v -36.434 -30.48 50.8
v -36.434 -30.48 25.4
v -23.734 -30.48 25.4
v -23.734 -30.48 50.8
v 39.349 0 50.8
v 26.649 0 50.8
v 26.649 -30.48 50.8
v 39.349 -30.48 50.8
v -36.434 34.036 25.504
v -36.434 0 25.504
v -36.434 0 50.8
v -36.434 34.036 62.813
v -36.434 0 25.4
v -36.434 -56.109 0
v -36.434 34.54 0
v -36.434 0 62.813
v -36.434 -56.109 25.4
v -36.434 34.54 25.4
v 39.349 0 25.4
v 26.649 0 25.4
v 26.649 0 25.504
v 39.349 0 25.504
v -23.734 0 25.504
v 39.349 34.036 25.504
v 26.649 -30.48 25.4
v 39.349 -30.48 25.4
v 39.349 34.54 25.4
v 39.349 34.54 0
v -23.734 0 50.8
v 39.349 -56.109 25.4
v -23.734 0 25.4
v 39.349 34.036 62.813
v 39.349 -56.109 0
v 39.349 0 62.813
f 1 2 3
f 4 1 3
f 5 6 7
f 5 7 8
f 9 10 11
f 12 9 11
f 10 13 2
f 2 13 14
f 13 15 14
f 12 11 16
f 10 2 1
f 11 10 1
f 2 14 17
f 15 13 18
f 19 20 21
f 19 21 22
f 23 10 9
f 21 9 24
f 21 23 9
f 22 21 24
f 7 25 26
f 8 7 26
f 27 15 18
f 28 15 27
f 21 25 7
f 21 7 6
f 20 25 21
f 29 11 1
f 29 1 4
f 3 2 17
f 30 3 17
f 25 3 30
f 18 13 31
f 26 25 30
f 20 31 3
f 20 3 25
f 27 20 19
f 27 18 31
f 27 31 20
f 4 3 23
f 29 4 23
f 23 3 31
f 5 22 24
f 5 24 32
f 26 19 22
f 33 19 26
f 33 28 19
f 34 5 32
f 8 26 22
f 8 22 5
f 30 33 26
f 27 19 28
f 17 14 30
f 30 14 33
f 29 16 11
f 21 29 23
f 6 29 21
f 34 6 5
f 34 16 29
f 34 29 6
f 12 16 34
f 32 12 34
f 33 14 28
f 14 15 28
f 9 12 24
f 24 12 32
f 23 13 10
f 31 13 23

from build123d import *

# Parameters (mm, degrees)
F0_W     = 75.78361
F0_H     = 90.648856
F1_DEPTH = 25.4
F2_W     = 12.7
F2_H     = 30.48
F3_DEPTH = 50.8
F4_W     = 75.78361
F4_H     = 37.308857
F5_DEPTH = 34.036


with BuildPart() as f1:
    # F0 (on Top) → F1 (new body)
    with BuildSketch(Plane.XY):
        with Locations((1.457378, -10.784591)):
            Rectangle(F0_W, F0_H)
    extrude(amount=F1_DEPTH)

    # F2 (on Top) → F3 (join)
    with BuildSketch(Plane.XY):
        with Locations((-30.084427, -15.24)):
            Rectangle(F2_W, F2_H)
        with Locations((32.999183, -15.24)):
            Rectangle(F2_W, F2_H)
    extrude(amount=F3_DEPTH)

    # F4 (on Front) → F5 (join)
    with BuildSketch(Plane.XZ):
        with Locations((1.457378, 44.158525)):
            Rectangle(F4_W, F4_H)
    extrude(amount=-F5_DEPTH)


solid = f1.part
